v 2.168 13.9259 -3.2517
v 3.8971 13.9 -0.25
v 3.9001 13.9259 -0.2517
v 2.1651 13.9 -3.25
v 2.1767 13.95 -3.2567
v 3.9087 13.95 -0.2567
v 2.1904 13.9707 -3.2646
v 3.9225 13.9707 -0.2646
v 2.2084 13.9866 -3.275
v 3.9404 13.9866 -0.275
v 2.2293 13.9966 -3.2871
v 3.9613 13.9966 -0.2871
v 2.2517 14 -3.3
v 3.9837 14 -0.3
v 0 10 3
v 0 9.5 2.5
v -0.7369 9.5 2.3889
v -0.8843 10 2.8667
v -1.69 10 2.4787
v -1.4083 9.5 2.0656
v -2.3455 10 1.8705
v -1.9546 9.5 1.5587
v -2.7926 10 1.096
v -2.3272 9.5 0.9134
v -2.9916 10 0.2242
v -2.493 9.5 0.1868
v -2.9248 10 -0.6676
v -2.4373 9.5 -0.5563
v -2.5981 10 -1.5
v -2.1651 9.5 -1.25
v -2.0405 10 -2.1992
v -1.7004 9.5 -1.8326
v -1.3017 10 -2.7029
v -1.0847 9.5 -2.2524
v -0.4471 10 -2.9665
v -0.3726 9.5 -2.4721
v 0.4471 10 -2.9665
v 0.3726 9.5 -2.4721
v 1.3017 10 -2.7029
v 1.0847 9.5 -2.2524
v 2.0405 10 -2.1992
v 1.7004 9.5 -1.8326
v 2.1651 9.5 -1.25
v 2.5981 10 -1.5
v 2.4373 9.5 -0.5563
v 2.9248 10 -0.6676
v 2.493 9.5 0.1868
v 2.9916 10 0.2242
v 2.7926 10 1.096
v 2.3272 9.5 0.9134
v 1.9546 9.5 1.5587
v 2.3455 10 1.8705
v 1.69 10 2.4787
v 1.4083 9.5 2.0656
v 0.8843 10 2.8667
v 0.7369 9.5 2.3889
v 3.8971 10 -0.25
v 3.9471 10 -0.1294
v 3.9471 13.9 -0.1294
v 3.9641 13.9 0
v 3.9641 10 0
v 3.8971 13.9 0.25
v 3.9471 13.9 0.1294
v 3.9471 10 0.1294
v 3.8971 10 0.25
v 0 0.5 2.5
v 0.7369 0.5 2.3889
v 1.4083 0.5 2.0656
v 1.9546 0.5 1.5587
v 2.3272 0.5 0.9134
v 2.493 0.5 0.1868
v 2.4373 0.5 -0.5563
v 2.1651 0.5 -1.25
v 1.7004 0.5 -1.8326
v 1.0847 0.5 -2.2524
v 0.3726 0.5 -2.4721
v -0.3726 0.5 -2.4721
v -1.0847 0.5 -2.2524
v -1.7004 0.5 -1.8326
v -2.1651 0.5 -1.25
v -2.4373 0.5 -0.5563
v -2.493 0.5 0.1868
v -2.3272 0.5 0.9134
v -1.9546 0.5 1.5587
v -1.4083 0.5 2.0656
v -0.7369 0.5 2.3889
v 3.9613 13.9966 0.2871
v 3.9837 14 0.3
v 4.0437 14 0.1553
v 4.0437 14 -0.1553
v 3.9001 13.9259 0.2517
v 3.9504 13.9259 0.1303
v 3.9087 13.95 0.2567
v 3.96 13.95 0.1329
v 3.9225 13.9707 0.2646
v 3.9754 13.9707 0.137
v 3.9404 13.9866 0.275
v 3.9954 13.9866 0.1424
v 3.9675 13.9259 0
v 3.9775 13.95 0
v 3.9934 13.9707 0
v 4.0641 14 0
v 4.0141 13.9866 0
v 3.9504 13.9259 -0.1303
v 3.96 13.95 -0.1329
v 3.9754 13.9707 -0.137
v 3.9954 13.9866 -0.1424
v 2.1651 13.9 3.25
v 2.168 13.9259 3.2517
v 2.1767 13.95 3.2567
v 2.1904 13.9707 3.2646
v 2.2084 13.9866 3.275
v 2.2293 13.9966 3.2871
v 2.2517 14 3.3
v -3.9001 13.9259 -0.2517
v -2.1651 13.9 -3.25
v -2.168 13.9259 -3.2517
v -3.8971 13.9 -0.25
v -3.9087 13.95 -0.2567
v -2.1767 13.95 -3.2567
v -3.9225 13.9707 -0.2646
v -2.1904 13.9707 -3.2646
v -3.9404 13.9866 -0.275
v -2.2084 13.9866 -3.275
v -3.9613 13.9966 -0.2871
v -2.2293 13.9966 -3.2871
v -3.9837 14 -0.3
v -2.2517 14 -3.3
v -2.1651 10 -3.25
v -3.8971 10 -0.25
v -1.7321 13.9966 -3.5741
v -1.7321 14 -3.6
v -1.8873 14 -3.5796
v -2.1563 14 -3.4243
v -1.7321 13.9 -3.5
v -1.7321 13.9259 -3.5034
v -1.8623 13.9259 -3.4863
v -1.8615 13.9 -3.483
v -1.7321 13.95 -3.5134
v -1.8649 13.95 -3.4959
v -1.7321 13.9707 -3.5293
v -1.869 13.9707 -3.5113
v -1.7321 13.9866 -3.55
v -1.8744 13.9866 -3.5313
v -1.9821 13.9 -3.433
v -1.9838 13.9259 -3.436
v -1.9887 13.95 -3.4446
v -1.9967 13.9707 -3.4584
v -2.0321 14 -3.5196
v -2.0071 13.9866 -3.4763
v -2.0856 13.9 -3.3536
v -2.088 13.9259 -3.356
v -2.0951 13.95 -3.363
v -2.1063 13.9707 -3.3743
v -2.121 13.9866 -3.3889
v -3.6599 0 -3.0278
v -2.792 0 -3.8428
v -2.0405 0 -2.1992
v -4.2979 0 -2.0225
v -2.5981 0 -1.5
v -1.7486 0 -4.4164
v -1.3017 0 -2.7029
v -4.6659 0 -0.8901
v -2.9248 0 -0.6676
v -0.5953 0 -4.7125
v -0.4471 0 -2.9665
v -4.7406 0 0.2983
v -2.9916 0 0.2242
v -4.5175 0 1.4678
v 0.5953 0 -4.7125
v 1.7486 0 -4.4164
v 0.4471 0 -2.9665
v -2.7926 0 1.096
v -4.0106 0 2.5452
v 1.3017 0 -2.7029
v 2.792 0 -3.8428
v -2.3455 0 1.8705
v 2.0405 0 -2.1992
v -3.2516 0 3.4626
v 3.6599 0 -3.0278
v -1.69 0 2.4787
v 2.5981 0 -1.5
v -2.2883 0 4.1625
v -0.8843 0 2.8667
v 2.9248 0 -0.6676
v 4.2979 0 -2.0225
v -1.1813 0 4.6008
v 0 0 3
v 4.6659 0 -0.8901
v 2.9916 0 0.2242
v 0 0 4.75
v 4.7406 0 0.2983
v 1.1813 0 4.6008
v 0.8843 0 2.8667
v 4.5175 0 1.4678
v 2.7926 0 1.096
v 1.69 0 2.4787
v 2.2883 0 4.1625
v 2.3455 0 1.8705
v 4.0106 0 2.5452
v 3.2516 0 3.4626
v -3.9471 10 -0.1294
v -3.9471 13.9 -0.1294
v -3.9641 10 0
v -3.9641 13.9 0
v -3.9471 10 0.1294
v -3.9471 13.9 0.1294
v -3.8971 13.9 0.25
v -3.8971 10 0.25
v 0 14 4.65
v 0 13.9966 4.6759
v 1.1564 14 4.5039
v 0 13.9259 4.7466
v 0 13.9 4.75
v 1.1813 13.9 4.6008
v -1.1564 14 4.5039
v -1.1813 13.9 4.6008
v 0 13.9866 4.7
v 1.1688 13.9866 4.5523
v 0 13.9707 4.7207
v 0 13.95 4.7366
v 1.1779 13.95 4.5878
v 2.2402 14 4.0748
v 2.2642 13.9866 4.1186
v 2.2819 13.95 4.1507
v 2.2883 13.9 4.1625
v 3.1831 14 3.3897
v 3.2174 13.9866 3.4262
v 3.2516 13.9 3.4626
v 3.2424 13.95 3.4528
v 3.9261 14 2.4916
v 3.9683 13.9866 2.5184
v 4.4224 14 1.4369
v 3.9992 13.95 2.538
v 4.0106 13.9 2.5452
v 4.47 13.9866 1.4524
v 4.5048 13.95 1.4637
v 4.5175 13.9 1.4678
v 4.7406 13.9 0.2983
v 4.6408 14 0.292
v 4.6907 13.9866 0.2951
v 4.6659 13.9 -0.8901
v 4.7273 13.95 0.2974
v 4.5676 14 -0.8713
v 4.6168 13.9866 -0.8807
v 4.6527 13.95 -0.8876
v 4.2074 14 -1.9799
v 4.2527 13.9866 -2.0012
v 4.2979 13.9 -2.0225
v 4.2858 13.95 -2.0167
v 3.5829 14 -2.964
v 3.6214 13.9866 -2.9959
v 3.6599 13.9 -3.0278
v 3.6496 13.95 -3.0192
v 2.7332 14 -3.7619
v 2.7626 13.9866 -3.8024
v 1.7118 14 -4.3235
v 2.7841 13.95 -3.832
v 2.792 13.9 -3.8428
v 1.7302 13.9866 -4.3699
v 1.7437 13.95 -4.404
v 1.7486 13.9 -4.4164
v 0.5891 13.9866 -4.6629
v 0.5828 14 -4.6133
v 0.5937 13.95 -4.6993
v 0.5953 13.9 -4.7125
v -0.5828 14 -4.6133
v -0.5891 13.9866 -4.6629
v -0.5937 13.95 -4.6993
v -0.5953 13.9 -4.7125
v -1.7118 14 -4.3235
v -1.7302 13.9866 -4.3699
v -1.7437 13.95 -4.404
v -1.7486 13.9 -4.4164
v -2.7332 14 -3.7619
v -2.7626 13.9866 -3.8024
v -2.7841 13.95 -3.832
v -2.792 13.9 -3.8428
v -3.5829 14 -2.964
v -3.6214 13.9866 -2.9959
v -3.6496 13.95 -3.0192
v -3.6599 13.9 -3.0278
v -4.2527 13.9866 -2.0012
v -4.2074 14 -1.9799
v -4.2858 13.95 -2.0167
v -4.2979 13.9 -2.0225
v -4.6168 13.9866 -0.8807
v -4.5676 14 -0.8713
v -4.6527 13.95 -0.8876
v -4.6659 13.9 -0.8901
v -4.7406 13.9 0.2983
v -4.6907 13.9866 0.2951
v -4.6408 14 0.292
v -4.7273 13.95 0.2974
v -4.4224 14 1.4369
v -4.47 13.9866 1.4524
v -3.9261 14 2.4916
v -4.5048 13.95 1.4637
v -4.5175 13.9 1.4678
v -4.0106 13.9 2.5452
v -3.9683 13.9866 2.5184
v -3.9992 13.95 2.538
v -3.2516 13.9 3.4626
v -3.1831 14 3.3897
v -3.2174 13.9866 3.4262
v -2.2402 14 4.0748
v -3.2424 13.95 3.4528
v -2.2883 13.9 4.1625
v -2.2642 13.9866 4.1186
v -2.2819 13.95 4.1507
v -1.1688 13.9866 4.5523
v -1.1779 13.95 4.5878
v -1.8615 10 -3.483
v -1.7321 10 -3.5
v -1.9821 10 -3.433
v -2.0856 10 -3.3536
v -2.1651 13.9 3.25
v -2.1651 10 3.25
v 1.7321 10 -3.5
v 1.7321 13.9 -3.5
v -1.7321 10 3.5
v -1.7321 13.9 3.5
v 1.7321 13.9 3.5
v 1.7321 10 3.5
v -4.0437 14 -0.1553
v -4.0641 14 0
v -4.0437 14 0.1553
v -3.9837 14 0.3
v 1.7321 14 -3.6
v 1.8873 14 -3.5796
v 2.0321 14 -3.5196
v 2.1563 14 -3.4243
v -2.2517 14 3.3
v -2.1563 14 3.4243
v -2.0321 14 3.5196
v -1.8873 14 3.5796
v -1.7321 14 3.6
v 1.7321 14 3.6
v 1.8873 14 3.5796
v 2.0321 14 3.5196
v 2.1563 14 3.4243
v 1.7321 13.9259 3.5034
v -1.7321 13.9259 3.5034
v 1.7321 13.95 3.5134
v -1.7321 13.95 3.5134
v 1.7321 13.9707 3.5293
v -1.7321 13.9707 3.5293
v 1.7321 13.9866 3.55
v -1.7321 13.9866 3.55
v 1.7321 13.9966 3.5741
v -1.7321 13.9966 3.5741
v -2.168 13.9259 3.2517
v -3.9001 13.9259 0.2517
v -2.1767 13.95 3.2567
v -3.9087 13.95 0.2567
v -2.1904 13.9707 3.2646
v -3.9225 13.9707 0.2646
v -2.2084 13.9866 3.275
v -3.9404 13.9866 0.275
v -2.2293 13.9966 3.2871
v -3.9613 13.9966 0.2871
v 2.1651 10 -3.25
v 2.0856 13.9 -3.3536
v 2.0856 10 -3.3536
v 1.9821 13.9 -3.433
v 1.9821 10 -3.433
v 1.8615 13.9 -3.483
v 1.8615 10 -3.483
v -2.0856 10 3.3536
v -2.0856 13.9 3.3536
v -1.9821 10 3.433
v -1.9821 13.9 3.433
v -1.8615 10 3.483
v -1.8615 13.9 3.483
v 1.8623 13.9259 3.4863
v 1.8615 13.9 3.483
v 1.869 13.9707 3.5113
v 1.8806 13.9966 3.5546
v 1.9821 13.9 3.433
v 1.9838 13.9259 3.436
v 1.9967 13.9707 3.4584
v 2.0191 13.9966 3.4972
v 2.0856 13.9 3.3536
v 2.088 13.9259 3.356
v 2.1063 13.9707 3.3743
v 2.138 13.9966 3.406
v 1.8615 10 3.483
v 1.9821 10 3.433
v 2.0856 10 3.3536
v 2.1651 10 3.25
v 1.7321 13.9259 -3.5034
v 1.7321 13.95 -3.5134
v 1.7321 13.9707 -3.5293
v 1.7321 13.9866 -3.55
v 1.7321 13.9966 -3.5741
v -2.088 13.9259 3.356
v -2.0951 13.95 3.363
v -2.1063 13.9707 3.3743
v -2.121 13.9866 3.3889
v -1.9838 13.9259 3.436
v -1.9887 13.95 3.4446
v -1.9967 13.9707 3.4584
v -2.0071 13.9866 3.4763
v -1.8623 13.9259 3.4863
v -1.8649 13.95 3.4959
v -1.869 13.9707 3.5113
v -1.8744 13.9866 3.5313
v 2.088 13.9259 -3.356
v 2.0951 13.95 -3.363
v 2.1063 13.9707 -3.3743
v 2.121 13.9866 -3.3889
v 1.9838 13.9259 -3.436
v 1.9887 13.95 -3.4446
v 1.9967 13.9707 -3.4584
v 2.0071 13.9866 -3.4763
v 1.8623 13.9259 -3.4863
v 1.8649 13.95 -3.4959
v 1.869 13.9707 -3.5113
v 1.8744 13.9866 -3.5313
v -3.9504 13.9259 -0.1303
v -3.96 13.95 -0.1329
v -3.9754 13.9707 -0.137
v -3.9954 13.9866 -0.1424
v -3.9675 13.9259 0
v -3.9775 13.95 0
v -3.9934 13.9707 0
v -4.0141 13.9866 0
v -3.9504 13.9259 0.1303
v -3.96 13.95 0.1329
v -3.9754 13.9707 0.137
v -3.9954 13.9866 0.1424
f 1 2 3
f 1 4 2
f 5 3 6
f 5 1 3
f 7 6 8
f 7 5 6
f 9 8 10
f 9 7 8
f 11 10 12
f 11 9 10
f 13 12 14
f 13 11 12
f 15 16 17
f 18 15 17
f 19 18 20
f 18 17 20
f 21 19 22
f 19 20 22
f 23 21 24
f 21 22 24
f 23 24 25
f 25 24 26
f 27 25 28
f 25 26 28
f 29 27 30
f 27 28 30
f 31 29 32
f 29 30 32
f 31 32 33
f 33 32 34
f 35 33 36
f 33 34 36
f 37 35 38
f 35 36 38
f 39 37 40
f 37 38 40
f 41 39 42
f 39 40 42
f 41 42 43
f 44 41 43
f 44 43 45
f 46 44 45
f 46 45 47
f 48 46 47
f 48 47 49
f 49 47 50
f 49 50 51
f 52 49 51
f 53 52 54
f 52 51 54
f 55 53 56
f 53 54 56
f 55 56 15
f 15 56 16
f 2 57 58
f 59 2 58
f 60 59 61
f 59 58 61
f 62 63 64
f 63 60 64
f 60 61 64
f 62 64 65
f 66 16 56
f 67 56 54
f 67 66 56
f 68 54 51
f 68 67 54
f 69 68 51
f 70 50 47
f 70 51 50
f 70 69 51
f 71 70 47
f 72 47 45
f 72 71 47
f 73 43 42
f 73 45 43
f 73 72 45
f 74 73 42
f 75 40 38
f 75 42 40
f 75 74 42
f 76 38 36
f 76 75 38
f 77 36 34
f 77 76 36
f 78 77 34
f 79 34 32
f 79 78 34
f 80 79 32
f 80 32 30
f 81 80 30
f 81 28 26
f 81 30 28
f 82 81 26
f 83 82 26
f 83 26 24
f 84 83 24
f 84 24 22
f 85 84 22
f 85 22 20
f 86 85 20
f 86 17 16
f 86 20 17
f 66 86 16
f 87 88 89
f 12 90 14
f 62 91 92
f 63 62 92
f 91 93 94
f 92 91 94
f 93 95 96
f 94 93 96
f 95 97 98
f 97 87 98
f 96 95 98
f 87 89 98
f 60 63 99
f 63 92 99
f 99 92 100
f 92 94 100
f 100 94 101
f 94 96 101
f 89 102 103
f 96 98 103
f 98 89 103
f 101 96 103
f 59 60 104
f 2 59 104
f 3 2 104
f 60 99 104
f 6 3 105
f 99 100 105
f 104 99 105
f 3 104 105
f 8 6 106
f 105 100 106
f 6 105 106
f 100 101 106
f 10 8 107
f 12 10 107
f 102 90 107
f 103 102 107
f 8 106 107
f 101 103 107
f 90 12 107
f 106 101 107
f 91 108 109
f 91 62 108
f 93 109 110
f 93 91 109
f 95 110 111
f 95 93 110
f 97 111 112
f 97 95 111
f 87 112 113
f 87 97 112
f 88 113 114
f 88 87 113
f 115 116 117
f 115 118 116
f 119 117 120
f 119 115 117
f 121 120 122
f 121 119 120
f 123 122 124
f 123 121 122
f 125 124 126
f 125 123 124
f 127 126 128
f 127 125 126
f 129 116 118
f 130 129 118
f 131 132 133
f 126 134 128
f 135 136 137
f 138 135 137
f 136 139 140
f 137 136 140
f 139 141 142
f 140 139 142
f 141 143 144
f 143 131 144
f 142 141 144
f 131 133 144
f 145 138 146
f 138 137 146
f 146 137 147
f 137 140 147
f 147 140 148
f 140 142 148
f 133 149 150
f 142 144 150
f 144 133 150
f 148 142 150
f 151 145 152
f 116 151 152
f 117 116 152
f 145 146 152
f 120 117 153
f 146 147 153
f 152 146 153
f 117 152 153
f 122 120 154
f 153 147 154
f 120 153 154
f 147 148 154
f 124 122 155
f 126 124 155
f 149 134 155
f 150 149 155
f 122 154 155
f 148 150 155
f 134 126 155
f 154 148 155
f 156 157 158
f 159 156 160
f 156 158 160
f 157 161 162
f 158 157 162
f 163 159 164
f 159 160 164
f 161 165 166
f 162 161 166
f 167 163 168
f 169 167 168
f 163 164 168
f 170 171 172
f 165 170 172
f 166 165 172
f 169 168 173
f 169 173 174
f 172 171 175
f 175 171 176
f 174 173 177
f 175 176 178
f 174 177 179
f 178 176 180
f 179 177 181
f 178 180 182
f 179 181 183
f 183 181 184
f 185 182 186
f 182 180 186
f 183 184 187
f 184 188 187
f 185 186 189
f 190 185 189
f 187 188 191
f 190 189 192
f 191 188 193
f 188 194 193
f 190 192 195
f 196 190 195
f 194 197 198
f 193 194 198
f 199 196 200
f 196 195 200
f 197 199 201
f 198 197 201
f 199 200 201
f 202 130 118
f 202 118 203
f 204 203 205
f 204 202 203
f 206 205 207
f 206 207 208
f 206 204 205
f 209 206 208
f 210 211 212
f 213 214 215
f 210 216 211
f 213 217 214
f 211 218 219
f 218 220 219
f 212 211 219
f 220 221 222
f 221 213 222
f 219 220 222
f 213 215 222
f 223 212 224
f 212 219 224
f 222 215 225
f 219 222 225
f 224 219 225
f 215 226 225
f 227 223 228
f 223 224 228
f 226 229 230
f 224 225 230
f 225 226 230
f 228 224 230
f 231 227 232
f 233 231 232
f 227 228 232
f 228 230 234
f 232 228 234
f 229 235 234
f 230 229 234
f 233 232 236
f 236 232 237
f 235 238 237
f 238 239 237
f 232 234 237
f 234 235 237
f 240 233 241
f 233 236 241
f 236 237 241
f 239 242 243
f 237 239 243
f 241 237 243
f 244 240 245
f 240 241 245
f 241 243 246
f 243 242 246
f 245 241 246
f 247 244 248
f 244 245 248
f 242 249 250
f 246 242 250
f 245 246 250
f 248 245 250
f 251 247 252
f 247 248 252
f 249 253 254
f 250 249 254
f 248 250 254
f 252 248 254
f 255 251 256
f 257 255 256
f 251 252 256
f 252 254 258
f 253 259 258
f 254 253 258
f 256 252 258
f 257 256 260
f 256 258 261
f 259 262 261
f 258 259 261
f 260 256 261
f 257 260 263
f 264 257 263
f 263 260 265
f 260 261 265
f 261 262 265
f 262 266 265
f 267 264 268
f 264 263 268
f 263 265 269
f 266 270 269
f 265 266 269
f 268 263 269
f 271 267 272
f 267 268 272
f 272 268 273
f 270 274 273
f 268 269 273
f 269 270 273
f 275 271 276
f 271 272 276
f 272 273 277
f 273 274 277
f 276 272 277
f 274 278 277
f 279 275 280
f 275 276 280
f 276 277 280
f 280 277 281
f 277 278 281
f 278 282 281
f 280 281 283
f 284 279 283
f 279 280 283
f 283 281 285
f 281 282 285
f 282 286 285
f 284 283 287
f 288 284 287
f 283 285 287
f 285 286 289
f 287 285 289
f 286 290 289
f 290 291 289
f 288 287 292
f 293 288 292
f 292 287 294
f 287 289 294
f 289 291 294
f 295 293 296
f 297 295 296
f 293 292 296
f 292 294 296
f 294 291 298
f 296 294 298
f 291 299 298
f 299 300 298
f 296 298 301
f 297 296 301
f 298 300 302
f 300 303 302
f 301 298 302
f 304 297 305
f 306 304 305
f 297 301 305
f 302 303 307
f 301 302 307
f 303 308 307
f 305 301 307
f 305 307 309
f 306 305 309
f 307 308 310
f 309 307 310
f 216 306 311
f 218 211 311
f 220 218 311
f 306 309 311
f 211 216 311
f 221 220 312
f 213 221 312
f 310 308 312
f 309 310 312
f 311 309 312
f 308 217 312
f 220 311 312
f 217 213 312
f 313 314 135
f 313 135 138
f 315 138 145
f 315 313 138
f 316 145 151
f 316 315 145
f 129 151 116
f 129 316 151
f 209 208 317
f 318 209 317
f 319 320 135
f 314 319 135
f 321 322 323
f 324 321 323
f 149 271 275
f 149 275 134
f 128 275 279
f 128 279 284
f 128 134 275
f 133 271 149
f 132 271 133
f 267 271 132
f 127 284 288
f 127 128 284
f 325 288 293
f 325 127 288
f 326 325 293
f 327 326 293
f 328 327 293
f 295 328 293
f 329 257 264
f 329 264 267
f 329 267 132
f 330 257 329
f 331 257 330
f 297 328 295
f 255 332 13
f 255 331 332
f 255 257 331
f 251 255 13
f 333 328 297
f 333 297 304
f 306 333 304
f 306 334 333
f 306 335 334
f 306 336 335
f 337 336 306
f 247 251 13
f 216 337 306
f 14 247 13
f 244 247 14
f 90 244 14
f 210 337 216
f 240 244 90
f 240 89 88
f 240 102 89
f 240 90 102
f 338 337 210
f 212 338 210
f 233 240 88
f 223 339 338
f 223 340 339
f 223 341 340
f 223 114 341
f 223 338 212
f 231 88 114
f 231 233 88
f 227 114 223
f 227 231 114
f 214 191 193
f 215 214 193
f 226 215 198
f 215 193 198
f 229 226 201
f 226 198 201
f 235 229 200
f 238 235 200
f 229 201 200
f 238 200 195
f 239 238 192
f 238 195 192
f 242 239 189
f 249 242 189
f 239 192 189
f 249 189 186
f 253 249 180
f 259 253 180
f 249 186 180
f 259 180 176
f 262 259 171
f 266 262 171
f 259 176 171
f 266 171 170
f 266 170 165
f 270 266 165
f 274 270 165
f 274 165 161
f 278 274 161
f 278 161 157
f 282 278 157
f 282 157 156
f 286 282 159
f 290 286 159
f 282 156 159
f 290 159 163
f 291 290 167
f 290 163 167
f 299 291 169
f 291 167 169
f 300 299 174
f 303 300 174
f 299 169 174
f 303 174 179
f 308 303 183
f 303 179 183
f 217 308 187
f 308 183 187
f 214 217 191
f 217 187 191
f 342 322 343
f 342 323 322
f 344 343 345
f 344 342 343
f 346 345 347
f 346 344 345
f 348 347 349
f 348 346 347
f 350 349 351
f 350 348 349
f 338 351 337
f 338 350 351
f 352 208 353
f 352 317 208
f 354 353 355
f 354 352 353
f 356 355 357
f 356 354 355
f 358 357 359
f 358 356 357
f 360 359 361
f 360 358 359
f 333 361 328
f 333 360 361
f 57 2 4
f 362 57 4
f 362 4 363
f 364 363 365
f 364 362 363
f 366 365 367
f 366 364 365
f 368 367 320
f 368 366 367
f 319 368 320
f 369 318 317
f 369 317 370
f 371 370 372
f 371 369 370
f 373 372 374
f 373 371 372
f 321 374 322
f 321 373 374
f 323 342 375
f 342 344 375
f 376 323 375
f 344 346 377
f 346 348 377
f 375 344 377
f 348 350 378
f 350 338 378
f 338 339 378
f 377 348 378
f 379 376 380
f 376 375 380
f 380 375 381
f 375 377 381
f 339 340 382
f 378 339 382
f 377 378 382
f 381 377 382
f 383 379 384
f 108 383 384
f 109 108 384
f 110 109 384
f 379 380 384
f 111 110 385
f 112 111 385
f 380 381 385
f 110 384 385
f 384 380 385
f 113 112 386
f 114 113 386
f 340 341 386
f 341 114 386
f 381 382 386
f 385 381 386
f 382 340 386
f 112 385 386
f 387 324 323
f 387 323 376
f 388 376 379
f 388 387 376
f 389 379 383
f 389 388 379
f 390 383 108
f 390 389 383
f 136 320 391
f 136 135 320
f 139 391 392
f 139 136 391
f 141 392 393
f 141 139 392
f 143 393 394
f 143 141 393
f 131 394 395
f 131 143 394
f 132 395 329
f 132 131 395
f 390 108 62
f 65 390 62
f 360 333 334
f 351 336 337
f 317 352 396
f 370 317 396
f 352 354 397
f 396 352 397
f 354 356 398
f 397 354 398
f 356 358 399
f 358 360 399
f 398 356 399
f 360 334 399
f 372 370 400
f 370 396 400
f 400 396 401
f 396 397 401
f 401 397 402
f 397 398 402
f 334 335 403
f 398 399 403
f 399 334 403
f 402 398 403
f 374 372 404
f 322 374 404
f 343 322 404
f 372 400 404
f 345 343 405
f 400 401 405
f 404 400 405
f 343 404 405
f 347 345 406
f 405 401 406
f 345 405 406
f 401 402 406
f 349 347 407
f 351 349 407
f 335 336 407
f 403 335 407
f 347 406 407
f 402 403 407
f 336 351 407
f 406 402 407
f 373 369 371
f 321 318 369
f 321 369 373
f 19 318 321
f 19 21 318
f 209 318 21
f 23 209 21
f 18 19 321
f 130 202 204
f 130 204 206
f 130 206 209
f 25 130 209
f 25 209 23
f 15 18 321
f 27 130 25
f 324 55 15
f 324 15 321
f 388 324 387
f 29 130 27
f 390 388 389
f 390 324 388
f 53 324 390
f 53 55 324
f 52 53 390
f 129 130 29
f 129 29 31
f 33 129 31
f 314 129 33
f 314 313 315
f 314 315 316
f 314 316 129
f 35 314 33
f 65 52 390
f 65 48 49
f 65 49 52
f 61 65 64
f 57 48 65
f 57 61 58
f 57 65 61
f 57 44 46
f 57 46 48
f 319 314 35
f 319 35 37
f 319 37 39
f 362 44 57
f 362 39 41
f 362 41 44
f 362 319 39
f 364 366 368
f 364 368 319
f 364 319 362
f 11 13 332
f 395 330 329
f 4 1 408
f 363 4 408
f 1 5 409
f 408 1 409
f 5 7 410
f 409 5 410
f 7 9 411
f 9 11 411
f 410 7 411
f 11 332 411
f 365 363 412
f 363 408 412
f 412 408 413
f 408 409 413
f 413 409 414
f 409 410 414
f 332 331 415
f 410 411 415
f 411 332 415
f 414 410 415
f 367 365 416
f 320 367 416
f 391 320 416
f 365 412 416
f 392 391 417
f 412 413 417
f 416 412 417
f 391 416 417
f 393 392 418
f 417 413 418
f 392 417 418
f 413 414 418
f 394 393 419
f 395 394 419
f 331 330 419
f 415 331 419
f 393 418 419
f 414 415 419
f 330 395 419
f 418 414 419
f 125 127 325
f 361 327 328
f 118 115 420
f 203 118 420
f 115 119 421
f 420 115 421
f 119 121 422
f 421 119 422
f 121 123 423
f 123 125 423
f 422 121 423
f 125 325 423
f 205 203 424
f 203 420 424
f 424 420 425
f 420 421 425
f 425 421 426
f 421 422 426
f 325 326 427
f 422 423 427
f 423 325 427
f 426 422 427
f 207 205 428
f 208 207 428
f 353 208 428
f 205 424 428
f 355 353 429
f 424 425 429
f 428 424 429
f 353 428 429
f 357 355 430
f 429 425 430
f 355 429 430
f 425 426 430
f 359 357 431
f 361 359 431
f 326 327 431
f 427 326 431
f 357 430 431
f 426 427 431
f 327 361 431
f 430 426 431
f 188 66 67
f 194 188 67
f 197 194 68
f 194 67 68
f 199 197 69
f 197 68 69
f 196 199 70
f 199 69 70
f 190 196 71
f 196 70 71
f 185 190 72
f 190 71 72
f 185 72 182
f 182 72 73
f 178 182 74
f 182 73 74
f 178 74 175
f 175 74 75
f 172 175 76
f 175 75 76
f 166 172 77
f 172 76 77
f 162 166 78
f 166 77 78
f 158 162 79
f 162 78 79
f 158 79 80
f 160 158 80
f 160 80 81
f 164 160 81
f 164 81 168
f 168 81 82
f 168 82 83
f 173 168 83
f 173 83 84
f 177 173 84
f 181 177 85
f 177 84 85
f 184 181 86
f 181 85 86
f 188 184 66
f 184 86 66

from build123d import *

# Parameters (mm, degrees)
SKETCH1_R           = 4.75
SKETCH1_R_2         = 2.5
BOSS_EXTRUDE1_DEPTH = 14
CUT_EXTRUDE1_DEPTH  = 4
FILLET1_R           = 0.5
CHAMFER1_SIZE       = 0.5
FILLET2_R           = 0.1


with BuildPart() as part:
    # Sketch1 → Boss-Extrude1 (new body)
    with BuildSketch(Plane(origin=(0, 0, 0), x_dir=(1, 0, 0), z_dir=(0, 1, 0))):
        with Locations(Location((0, 0, 0), (0, 0, 270))):
            Circle(SKETCH1_R)
        with Locations(Location((0, 0, 0), (0, 0, 270))):
            Circle(SKETCH1_R_2, mode=Mode.SUBTRACT)
    extrude(amount=BOSS_EXTRUDE1_DEPTH)

    # Sketch2 → Cut-Extrude1 (cut)
    with BuildSketch(Plane(origin=(0, 14, 0), x_dir=(1, 0, 0), z_dir=(0, 1, 0))):
        Polygon((4.041451884, 0), (2.020725942, 3.5), (-2.020725942, 3.5), (-4.041451884, 0), (-2.020725942, -3.5), (2.020725942, -3.5), align=None)
    extrude(amount=-CUT_EXTRUDE1_DEPTH, mode=Mode.SUBTRACT)

    # Fillet1
    fillet1_edges = [part.edges().sort_by_distance(p)[0] for p in [
        (4.041451884, 12, 0),
        (2.020725942, 12, 3.5),
        (-2.020725942, 12, 3.5),
        (-4.041451884, 12, 0),
        (-2.020725942, 12, -3.5),
        (2.020725942, 12, -3.5),
    ]]
    fillet(fillet1_edges, radius=FILLET1_R)

    # Chamfer1
    chamfer1_edges = [part.edges().sort_by_distance(p)[0] for p in [
        (0, 10, -2.5),
        (0, 0, -2.5),
    ]]
    chamfer(chamfer1_edges, length=CHAMFER1_SIZE)

    # Fillet2
    fillet2_edges = [part.edges().sort_by_distance(p)[0] for p in [
        (3.031088913, 14, 1.75),
        (0, 14, 3.5),
        (-3.031088913, 14, 1.75),
        (0, 14, -4.75),
        (-3.031088913, 14, -1.75),
        (3.031088913, 14, -1.75),
        (0, 14, -3.5),
        (1.982050808, 14, 3.433012702),
        (-1.982050808, 14, 3.433012702),
        (-3.964101615, 14, 0),
        (3.964101615, 14, 0),
        (1.982050808, 14, -3.433012702),
        (-1.982050808, 14, -3.433012702),
    ]]
    fillet(fillet2_edges, radius=FILLET2_R)


solid = part.part
